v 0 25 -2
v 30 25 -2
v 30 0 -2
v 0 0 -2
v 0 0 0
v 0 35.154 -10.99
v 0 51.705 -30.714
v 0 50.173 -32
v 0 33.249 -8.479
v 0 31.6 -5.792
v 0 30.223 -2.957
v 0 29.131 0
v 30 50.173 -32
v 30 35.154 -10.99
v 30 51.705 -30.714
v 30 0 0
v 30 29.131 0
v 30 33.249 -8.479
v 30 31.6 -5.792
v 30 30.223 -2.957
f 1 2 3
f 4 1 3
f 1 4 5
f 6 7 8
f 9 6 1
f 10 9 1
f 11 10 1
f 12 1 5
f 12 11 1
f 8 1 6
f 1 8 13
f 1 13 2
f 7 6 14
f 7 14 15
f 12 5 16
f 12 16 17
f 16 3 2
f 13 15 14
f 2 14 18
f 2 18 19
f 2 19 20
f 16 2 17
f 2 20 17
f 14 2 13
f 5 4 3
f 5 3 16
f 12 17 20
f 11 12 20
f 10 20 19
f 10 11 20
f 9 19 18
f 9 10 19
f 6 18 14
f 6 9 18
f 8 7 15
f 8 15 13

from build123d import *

# Parameters (mm, degrees)
BOSS_EXTRUDE1_DEPTH = 30


with BuildPart() as part:
    # Sketch1 → Boss-Extrude1 (new body)
    with BuildSketch(Plane(origin=(0, 0, 0), x_dir=(0, 0, -1), z_dir=(1, 0, 0))):
        with BuildLine():
            Line((0, 0), (0, 29.130560593))
            ThreePointArc((0, 29.130560593), (5.792341896, 31.60023967), (10.990207869, 35.154494686))
            Line((10.990207869, 35.154494686), (30.714424781, 51.705077822))
            Line((30.714424781, 51.705077822), (32, 50.172988935))
            Line((32, 50.172988935), (2, 25))
            Line((2, 25), (2, 0))
            Line((2, 0), (0, 0))
        make_face()
    extrude(amount=BOSS_EXTRUDE1_DEPTH)


solid = part.part
